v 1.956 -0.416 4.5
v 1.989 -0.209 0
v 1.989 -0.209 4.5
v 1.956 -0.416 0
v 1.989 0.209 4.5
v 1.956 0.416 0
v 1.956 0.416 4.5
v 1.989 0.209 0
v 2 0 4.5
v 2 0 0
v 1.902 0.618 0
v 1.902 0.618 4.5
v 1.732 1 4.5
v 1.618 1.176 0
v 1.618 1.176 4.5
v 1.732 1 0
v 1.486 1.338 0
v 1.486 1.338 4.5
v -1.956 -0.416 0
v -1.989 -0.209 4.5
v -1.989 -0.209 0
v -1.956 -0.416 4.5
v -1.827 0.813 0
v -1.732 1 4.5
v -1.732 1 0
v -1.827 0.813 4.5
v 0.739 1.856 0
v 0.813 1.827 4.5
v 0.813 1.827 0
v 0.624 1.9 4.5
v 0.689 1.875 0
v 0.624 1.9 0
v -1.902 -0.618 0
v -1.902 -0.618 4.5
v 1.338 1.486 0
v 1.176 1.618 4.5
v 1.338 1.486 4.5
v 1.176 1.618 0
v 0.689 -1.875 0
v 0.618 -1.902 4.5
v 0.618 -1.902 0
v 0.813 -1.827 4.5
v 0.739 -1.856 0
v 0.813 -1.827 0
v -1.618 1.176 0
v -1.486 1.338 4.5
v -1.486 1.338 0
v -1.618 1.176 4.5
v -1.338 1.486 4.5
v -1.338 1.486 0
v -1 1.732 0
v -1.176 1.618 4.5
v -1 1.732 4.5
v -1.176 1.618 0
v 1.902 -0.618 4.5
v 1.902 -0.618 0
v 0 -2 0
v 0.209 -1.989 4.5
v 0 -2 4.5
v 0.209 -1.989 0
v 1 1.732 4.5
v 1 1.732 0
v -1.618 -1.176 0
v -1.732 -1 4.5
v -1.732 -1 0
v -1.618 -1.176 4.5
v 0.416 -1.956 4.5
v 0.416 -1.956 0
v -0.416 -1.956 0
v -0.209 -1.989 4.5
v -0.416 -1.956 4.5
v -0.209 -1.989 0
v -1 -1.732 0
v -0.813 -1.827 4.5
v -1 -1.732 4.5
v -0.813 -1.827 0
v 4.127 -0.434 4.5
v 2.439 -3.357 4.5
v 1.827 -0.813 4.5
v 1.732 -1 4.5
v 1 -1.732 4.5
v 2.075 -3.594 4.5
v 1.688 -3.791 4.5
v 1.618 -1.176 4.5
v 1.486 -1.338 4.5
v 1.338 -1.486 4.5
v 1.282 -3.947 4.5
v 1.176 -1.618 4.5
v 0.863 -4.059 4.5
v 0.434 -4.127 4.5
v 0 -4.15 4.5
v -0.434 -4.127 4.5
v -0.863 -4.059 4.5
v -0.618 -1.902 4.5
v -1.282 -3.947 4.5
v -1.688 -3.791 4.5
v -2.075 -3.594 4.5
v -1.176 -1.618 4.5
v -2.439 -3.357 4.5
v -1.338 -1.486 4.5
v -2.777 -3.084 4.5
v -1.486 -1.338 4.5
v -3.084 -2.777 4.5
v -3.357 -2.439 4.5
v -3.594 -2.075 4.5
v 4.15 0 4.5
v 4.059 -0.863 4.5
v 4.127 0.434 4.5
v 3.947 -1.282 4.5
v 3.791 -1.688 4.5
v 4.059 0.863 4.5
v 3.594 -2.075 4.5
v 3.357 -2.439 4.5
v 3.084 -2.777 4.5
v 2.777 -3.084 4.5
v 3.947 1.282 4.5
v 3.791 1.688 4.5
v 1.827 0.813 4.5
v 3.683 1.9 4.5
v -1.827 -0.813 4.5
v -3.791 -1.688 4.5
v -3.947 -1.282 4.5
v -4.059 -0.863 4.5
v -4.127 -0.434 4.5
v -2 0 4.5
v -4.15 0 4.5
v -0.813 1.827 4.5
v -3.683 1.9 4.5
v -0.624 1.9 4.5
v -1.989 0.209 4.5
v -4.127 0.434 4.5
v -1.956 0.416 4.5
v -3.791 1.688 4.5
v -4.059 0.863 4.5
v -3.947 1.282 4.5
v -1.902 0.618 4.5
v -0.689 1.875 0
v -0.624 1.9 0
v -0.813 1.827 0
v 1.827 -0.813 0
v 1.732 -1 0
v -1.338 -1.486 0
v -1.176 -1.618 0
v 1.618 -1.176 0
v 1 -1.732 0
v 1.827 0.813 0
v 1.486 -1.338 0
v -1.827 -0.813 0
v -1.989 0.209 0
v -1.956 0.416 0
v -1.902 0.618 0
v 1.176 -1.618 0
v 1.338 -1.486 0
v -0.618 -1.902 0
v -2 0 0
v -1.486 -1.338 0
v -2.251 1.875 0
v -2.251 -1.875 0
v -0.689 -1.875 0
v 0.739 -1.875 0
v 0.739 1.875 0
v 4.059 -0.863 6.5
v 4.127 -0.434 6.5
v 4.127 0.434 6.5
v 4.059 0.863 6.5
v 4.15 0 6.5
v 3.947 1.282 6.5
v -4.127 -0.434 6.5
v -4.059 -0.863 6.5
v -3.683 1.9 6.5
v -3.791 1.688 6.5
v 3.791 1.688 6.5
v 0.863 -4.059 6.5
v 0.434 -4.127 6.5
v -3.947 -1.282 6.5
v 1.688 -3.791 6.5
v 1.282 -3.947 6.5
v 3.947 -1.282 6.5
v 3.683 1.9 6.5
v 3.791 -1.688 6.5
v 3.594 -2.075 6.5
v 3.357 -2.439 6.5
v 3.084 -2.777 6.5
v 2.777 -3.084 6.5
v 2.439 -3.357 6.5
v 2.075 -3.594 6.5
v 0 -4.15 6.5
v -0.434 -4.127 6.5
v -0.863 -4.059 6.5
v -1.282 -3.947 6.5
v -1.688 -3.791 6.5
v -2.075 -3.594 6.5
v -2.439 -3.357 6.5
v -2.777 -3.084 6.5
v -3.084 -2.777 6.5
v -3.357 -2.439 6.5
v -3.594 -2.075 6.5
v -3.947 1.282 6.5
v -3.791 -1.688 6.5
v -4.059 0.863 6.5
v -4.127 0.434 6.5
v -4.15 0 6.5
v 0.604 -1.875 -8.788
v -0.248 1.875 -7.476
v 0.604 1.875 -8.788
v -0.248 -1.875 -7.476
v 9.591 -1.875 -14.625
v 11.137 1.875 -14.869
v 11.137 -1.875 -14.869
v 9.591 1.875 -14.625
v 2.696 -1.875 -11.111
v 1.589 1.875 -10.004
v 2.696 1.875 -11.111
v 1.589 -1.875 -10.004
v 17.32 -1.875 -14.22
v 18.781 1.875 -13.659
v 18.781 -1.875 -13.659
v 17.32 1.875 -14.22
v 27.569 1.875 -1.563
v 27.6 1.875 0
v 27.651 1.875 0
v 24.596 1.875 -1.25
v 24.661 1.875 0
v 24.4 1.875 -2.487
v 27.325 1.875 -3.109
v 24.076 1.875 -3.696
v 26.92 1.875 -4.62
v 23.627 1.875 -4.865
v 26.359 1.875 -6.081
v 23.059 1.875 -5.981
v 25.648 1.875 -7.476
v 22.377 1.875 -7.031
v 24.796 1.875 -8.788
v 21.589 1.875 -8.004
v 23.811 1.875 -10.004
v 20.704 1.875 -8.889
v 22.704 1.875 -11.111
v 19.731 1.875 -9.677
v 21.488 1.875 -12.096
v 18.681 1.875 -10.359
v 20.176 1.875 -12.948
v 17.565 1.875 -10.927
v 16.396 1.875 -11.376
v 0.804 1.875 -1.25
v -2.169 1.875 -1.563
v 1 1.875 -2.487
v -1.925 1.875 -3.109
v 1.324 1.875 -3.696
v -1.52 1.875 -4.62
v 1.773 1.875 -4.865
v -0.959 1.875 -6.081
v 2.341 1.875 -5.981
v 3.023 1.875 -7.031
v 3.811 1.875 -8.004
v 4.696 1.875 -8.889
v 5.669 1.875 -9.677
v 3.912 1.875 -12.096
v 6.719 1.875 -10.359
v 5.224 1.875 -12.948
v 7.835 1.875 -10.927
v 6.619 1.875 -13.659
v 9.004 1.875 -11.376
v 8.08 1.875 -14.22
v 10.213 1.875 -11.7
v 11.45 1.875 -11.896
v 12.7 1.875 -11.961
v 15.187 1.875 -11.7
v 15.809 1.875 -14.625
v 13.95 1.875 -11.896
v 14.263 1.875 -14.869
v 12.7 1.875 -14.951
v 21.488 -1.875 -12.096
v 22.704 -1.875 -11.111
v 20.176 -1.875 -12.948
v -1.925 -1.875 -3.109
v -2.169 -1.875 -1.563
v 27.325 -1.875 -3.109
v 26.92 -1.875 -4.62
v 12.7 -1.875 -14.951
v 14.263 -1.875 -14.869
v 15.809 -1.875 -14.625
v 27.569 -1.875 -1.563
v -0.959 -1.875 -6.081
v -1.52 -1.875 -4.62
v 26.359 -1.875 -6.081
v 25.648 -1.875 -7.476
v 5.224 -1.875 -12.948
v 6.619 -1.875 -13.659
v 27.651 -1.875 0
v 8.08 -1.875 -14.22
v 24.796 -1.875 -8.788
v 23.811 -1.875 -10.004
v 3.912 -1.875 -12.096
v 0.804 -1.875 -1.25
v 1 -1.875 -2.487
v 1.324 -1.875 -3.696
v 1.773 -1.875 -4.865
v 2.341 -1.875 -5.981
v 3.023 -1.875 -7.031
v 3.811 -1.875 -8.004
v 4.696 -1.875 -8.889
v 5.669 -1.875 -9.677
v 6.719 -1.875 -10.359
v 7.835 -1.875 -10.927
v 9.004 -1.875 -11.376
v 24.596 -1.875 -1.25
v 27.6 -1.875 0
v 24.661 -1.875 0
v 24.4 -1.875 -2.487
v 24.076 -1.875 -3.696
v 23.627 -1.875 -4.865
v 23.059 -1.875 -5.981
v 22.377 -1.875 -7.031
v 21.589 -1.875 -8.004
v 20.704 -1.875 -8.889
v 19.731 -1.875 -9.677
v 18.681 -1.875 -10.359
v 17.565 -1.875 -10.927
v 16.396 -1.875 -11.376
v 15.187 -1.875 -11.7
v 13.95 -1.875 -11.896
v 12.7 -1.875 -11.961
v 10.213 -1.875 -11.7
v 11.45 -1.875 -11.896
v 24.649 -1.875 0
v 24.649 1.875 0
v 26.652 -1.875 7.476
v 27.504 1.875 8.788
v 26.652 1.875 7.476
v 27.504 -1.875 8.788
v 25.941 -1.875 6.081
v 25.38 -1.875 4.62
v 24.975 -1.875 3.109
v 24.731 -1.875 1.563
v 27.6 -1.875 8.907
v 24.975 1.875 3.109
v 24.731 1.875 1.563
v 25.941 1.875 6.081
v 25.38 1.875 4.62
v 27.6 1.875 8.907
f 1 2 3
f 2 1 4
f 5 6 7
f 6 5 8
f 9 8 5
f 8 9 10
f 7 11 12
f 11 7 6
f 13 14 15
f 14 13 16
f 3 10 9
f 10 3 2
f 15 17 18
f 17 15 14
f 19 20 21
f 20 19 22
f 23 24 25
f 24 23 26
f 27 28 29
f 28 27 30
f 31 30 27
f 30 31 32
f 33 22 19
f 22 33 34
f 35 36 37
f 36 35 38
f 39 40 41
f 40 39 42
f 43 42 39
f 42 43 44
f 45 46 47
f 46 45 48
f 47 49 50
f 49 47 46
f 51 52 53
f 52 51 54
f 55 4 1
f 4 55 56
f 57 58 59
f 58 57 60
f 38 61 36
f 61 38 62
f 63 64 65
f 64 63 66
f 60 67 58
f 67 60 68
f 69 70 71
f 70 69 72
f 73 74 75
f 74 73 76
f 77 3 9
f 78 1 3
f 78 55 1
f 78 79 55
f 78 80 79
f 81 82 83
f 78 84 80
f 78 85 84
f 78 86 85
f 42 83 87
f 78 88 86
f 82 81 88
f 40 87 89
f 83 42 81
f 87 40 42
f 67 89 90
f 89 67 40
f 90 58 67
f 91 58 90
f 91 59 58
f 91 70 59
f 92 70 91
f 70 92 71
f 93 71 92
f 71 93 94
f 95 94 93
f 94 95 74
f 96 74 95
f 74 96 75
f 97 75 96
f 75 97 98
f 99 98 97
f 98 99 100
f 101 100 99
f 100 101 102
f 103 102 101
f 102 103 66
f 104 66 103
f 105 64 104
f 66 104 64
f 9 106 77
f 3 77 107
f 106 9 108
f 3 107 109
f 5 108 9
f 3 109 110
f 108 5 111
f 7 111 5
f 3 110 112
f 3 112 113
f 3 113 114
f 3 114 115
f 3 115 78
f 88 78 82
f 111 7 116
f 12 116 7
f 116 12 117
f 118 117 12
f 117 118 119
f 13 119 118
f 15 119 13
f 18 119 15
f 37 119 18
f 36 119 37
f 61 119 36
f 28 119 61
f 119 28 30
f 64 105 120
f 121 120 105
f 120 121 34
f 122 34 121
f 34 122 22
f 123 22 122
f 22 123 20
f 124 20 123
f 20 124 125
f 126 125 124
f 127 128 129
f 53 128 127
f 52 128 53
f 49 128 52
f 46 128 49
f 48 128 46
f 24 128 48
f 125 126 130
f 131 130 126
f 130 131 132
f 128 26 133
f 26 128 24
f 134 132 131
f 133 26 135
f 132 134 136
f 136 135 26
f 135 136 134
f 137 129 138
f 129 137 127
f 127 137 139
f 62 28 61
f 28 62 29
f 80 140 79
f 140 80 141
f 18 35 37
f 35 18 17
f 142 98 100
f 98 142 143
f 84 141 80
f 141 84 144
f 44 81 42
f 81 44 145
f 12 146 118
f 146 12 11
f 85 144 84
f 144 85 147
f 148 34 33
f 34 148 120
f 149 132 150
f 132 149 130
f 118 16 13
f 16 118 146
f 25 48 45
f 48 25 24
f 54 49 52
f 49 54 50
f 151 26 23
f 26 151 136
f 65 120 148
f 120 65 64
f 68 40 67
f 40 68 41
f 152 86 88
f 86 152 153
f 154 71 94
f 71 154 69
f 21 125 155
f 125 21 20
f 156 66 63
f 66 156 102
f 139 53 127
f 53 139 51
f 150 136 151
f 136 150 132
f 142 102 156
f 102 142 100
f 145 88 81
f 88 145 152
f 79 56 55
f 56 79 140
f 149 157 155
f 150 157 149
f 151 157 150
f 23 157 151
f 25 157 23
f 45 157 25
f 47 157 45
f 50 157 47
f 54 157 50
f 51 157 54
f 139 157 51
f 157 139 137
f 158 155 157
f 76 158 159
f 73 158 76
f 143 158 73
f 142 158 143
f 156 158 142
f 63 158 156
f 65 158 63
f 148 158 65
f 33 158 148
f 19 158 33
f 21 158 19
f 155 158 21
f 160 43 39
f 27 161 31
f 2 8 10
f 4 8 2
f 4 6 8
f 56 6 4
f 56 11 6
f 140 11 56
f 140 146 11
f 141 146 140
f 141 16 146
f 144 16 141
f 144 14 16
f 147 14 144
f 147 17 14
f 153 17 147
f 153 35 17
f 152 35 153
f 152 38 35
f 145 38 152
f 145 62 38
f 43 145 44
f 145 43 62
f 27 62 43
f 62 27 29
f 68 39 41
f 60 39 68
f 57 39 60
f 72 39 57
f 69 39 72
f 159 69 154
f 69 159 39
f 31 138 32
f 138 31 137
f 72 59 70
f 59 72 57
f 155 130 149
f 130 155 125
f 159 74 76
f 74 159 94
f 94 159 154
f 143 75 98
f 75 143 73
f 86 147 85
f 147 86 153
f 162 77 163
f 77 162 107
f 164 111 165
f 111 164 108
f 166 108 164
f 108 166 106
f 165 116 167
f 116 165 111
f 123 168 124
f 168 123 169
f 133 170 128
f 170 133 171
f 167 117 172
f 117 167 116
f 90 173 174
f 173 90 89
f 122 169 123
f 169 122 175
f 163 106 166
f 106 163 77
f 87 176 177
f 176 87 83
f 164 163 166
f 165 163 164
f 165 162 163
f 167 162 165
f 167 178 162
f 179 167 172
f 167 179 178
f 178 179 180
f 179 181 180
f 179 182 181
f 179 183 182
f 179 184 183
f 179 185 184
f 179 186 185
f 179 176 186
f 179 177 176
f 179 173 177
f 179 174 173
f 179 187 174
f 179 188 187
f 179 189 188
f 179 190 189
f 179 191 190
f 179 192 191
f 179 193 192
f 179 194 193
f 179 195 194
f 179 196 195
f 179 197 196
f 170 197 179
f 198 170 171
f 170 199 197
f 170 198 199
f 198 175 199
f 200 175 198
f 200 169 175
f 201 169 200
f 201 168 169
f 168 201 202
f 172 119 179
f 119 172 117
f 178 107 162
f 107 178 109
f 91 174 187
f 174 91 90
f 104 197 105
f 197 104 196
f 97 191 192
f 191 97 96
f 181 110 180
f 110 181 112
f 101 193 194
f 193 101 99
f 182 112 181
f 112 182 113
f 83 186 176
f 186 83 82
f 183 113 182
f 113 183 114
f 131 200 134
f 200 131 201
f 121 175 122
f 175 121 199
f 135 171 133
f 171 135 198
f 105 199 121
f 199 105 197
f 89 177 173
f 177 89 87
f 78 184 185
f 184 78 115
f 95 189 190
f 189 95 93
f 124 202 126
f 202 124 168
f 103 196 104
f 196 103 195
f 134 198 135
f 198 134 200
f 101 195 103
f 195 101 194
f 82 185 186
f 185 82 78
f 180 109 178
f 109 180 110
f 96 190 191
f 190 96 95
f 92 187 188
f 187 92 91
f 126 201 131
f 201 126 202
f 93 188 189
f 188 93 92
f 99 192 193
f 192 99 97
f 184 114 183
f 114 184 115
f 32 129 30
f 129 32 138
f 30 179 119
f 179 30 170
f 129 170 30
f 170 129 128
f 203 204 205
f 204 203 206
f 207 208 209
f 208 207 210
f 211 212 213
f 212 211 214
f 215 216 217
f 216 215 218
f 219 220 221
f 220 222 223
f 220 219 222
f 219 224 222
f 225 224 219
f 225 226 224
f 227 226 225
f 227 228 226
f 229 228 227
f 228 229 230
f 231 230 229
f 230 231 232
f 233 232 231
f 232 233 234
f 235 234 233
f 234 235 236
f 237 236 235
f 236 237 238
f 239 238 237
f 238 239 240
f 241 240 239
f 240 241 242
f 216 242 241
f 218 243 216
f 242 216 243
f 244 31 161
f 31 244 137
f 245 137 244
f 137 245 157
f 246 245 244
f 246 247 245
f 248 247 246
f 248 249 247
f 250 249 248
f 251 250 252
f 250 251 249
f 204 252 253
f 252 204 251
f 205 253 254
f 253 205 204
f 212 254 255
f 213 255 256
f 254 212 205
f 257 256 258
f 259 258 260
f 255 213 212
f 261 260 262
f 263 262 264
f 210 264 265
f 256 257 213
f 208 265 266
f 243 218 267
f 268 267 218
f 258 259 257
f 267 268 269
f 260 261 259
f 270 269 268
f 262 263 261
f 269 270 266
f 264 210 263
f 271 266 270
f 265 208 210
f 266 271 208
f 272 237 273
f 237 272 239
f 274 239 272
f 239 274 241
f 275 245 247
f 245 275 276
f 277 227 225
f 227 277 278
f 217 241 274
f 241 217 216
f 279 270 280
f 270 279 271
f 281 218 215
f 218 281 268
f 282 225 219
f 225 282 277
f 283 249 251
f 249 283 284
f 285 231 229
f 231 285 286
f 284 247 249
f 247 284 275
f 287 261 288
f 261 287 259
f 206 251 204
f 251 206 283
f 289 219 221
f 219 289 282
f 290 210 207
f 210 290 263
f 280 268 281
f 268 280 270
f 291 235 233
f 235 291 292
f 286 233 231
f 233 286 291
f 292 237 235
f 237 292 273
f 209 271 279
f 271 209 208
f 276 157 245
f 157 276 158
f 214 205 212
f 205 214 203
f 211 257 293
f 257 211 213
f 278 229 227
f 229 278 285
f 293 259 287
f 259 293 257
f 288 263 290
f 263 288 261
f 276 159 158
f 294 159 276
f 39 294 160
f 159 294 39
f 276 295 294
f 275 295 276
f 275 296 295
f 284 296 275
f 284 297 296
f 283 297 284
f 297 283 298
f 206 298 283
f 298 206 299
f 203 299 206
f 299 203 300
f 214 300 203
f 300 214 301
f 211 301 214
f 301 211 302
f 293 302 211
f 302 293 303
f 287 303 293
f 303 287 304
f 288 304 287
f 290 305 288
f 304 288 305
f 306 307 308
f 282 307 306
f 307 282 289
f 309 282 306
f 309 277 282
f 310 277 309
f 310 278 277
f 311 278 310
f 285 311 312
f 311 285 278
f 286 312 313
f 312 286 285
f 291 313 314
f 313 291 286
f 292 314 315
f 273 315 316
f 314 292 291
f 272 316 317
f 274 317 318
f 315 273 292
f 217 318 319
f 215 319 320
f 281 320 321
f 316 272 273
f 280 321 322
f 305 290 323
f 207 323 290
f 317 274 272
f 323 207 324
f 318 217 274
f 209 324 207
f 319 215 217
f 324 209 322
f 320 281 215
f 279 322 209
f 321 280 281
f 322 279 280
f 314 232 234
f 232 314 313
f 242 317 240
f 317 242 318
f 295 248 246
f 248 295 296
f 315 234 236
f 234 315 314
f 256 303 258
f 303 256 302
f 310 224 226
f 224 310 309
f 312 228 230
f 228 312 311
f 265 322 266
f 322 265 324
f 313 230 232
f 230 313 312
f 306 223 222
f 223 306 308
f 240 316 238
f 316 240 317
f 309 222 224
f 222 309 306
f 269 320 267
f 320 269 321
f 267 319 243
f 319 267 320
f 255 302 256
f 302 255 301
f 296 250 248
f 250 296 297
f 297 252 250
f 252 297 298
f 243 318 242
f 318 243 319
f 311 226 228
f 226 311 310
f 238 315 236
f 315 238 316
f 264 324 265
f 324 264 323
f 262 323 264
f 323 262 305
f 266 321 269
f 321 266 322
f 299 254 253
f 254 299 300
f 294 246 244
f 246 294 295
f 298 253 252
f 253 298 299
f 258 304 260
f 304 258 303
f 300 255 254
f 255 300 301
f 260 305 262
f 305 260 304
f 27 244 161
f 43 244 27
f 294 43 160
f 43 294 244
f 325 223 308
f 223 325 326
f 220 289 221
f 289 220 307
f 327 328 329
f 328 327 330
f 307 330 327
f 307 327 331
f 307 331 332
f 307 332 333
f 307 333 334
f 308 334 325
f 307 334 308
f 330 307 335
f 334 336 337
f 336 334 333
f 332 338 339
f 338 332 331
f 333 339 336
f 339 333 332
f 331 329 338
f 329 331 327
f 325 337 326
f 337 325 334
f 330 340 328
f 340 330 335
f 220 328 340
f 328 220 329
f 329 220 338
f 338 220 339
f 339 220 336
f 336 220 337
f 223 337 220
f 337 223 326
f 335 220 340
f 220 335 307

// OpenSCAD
hole_width=6.0035;
pegboard_thickness=5;
$fn=60;

module end(length,thickness=1,cap=0) {
    c_h = length - hole_width/2 - cap * hole_width/2;
    translate([0,0,hole_width/2]) {
        cylinder(d=hole_width*thickness,h=c_h );
        translate([0,0,-hole_width/2]) cylinder(d1=0,d2=hole_width*thickness,h=hole_width/2);
    }
}
module back() {    
    side_thickness=.25;
    prong_length = hole_width*2;
    translate([0,0,-prong_length-pegboard_thickness]) {
        end(prong_length+pegboard_thickness, 1, 0);
    }
}

piece_thickness=3;
screw_head_max=9.3;
shaft=4;

module cap() {
    cylinder(d=shaft,h=piece_thickness*1.5);
    translate([0,0,piece_thickness*1.5]) cylinder(d=screw_head_max-1,h=piece_thickness-1);
}


module pegboard() {
    difference() {
        translate([-100,-100,-pegboard_thickness]) color("brown", .5) cube([200,200,pegboard_thickness]);
//        translate([0,0,-100]) cylinder(d=hole_width,h=200);
        for (x = [-25.4 * 5: 25.4 : 200]) {
            for (y = [-25.4 * 5: 25.4 : 200]) {
                translate([x,y,-100]) cylinder(d=hole_width,h=200);
            }
        }
                
    }
}


//back();
difference() {
    cap();
    translate([-5,1.9,0]) cube([10,10,10]);
}
//pegboard();
//
translate([25.4/2,pegboard_thickness*0.75/2,0]) rotate([90,0,0])
difference() {
    cylinder(d=25.4 + hole_width * 0.75, h=pegboard_thickness*0.75);
    translate([0,0,-1]) cylinder(d=(25.4 + hole_width * 0.75) * 0.8, h=pegboard_thickness*0.75 + 2);
    translate([-100,-0, -100]) cube([200,200,200]);
}

translate([25.4*1.5 + 1.5,-pegboard_thickness*0.75/2 ,0]) rotate([-90,0,0])
difference() {
    cylinder(d=25.4 + hole_width * 0.75, h=pegboard_thickness*0.75);
    translate([0,0,-1]) cylinder(d=(25.4 + hole_width * 0.75) * 0.8, h=pegboard_thickness*0.75 + 2);
    translate([-100,-0, -100]) cube([200,200,200]);
    translate([-12,-100, -100]) cube([200,200,200]);
}
